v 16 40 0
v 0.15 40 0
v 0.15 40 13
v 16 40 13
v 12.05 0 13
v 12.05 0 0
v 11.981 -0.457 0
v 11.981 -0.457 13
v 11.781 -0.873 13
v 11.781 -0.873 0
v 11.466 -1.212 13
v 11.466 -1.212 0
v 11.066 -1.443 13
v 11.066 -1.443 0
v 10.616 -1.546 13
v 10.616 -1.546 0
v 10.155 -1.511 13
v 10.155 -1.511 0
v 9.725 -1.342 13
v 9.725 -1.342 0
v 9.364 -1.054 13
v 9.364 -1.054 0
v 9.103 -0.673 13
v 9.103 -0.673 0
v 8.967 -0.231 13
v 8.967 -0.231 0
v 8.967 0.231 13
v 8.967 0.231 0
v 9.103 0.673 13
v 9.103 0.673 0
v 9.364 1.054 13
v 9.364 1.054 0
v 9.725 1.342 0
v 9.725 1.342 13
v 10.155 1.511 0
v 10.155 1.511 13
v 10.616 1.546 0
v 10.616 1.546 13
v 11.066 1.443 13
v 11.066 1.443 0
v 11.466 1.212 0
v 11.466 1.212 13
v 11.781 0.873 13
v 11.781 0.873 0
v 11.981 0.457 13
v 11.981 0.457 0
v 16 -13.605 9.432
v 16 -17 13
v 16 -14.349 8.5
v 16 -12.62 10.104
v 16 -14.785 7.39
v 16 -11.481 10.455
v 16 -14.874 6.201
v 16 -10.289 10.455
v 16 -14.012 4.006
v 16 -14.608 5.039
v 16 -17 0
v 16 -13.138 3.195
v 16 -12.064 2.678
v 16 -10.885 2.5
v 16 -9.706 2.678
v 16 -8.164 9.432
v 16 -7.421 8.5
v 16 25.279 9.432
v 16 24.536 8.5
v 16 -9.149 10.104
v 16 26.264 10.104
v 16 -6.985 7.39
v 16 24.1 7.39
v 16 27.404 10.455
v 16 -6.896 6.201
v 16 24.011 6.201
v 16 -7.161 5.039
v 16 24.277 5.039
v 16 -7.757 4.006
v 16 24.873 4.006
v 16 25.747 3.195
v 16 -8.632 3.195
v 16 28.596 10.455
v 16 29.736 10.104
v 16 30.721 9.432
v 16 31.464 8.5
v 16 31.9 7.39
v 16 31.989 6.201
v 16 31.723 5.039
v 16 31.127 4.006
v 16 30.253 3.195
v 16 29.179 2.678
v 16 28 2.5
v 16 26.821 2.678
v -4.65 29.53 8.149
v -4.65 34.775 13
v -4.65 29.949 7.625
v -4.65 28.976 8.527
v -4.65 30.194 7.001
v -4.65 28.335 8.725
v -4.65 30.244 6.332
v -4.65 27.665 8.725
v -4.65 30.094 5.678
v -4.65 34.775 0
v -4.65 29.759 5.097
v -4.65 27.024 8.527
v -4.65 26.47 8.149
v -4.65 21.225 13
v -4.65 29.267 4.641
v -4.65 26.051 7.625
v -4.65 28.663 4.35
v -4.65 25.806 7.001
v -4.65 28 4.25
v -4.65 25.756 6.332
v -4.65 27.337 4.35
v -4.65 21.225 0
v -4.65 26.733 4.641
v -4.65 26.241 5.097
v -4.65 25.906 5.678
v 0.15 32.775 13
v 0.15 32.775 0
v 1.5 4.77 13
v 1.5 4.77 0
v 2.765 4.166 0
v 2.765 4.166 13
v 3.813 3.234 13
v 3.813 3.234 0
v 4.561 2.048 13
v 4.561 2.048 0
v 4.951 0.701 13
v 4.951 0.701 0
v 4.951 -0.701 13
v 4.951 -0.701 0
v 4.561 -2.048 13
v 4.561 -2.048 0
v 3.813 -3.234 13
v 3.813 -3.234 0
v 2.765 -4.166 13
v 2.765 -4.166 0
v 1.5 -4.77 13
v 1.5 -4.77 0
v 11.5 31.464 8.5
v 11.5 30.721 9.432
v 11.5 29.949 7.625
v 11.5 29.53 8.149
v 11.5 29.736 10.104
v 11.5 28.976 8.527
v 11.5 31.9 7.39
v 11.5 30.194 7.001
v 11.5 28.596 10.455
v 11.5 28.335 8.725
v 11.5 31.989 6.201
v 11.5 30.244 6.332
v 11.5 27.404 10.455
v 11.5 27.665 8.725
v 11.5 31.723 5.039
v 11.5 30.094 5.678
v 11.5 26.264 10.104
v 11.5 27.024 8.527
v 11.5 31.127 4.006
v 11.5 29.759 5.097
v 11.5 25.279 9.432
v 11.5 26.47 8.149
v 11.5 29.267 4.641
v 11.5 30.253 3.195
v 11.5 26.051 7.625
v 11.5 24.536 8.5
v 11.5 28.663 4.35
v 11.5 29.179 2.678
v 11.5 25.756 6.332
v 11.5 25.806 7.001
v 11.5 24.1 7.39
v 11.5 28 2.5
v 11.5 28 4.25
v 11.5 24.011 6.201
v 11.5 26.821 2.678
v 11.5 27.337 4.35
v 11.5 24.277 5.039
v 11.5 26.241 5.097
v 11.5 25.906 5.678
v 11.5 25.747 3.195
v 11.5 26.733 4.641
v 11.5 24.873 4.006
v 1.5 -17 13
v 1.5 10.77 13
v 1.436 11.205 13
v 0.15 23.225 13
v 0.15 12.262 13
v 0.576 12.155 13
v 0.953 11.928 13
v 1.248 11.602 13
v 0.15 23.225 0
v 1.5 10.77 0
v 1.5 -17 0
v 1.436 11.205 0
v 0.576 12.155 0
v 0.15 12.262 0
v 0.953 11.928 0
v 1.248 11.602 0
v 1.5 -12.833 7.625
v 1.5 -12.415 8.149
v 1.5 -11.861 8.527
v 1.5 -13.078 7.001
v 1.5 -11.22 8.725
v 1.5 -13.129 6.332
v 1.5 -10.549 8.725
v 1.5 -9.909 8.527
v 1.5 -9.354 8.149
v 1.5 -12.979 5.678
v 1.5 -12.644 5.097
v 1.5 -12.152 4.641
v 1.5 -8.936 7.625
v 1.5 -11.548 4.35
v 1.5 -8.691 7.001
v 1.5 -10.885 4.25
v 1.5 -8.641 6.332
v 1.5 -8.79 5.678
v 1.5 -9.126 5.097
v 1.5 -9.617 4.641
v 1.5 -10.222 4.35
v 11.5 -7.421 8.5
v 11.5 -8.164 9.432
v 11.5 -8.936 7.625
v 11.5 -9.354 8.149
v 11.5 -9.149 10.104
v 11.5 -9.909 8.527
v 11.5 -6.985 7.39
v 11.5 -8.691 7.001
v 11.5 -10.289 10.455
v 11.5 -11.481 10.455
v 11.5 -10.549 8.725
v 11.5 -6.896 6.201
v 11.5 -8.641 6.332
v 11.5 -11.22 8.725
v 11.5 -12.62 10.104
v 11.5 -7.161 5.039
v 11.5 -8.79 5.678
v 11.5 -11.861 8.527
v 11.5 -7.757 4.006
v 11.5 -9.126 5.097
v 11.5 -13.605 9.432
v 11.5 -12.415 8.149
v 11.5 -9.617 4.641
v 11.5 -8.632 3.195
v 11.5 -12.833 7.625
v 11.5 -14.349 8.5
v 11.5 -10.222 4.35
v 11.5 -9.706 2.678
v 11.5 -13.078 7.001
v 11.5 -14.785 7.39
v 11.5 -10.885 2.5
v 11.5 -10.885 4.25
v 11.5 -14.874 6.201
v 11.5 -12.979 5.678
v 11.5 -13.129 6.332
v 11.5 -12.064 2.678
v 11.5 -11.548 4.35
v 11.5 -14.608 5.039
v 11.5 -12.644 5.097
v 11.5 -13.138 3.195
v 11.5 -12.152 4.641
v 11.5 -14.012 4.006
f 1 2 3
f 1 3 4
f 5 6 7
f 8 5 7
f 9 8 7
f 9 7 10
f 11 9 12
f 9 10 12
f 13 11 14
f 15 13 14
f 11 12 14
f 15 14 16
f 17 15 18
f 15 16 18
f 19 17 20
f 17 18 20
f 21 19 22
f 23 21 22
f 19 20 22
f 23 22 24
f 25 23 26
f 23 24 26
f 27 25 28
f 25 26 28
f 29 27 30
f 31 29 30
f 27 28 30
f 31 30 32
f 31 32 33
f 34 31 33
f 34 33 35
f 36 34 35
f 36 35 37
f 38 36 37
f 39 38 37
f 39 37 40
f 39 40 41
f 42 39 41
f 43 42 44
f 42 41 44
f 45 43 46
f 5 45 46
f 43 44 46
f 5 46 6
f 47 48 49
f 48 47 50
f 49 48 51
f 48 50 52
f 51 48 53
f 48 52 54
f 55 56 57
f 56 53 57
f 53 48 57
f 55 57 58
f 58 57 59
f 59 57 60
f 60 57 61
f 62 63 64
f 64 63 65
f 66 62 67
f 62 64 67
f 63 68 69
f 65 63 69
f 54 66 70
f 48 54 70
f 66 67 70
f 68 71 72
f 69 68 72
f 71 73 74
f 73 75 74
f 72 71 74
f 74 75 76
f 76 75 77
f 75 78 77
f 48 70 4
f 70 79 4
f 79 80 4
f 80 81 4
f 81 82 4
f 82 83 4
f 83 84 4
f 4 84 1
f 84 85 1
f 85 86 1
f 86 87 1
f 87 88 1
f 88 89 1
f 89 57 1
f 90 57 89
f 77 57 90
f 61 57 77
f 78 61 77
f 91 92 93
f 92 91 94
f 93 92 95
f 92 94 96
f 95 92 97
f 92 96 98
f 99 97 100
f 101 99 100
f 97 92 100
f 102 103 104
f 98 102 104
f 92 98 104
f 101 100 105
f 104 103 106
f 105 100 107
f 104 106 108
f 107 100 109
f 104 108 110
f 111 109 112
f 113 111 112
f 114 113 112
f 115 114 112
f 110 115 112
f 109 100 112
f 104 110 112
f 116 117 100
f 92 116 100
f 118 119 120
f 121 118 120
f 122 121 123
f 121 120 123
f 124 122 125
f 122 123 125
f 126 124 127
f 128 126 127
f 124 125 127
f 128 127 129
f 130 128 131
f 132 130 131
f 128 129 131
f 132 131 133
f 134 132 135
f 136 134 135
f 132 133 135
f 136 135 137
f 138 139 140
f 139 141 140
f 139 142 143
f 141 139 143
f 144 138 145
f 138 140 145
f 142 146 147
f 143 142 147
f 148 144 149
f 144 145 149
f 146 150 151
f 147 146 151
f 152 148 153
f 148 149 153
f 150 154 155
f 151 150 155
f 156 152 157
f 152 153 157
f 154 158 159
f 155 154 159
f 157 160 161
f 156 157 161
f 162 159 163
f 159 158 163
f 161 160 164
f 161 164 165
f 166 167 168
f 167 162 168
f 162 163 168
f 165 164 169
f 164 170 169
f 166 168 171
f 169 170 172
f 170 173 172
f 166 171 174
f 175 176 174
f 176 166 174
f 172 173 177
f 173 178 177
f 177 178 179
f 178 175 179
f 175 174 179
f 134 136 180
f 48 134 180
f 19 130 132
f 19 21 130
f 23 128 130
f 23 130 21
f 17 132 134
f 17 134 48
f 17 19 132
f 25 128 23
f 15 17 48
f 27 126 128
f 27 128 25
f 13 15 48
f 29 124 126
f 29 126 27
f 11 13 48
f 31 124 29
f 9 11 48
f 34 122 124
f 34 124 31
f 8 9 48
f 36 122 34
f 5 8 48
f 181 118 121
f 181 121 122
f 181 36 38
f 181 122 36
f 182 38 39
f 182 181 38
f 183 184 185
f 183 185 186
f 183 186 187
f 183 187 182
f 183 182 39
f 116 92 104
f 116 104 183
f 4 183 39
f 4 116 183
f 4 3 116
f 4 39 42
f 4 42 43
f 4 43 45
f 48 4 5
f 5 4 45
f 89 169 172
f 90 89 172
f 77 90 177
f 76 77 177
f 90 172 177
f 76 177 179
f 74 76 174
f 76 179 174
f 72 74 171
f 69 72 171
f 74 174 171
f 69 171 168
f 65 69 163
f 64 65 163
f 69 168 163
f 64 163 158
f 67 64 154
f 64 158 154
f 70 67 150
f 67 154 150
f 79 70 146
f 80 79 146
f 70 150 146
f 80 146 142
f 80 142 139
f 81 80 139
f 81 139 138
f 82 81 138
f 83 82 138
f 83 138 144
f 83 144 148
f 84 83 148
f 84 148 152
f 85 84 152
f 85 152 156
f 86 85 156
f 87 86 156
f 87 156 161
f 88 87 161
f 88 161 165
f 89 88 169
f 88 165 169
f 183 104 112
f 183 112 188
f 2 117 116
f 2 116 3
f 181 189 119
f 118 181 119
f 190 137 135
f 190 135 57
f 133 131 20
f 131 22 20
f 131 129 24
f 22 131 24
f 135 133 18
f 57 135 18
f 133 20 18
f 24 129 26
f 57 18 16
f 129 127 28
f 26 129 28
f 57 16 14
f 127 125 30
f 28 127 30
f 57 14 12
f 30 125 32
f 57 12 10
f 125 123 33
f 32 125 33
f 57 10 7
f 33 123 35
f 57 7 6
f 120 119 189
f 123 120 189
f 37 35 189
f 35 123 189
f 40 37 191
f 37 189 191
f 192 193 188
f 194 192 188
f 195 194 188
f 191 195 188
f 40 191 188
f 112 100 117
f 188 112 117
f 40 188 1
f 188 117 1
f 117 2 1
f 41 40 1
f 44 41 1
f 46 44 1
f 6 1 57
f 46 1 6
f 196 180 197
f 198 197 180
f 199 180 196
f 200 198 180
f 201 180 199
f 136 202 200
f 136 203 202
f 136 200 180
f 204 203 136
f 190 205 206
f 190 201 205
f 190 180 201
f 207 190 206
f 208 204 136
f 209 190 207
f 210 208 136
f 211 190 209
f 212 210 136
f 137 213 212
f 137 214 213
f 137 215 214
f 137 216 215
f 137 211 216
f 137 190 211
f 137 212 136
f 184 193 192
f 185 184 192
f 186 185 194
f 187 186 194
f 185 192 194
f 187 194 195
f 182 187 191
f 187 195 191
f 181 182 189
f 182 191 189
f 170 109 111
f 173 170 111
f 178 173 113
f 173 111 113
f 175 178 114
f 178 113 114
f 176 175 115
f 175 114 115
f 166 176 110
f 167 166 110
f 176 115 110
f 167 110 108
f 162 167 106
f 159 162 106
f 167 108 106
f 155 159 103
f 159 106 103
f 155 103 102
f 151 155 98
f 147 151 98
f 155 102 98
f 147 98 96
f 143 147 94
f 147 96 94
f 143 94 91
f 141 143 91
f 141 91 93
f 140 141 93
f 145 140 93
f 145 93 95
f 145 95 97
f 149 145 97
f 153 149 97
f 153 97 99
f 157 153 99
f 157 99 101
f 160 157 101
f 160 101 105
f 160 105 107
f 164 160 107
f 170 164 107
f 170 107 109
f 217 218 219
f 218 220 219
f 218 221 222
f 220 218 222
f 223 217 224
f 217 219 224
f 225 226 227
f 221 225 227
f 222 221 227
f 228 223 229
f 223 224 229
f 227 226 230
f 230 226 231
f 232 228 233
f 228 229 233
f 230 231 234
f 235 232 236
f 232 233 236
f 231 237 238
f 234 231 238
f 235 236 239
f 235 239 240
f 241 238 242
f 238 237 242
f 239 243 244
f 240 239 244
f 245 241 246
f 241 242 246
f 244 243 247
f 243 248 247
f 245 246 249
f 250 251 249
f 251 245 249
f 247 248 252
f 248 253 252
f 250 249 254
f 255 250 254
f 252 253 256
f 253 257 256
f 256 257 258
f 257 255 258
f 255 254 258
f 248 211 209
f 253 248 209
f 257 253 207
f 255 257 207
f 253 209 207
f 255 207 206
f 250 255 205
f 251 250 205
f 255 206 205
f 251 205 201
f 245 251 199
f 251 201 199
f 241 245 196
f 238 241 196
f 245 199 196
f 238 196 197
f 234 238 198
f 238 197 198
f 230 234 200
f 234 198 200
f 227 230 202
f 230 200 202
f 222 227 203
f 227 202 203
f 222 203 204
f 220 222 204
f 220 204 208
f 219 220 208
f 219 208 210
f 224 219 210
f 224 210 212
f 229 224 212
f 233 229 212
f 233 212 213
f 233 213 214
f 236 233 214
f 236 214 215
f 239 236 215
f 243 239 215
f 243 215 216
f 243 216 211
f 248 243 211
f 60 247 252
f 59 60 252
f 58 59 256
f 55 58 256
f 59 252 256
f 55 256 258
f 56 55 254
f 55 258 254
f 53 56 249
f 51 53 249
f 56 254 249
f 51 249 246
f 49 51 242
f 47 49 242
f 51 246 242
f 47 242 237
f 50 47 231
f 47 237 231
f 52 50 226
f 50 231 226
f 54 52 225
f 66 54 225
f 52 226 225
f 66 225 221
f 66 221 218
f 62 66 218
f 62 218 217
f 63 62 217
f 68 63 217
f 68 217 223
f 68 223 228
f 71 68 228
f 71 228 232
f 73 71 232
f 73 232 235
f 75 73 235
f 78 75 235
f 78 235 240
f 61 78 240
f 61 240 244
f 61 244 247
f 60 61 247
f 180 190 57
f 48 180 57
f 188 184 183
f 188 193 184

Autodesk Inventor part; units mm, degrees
ref_plane "YZ Plane" through (0, 0, 0) normal (1, 0, 0) x (0, 1, 0)
ref_plane "XZ Plane" through (0, 0, 0) normal (0, 1, 0) x (-1, 0, 0)
sketch "Skizze1" plane through (0, 0, 0) normal (0, 0, 1) x (1, 0, 0)
  line L0 (-33.0017, 0) -> (83.0017, 0) construction
  circle A0 centre (50, 151.9868) radius 16
  line L1 (66, 151.9868) -> (66, 221.9868)
  line L2 (34, 151.9868) -> (34, 221.9868)
  line L3 (50, 151.9868) -> (50, 237.9868) construction
  line L4 (50, 151.9868) -> (50, 167.9868) construction
  line L5 (34, 151.9868) -> (66, 151.9868) construction
  line L6 (-16, 0) -> (-16, 50)
  line L7 (16, 0) -> (16, 50)
  line L8 (-16, 50) -> (16, 50) construction
  circle A1 centre (0, 50) radius 16 construction
  line L9 (-14.2566, 57.2629) -> (34, 151.9868)
  arc A2 (-14.2566, 57.2629) -> (-16, 50) centre (0, 50) ccw
  line L10 (16, 50) -> (64.2566, 144.7239)
  arc A3 (64.2566, 144.7239) -> (66, 151.9868) centre (50, 151.9868) ccw
  line L11 (0, 50) -> (50, 151.9868) construction
  circle A4 centre (50, 221.9868) radius 16
  circle A5 centre (50, 221.9868) radius 9.5
  circle A6 centre (50, 151.9868) radius 9.5
  line L12 (0, 0) -> (0, 5) construction
  circle A7 centre (50, 151.9868) radius 12.75 construction
  circle A8 centre (50, 221.9868) radius 12.75 construction
  line L13 (0, 0) -> (50, 221.9868) construction
  circle A9 centre (50, 221.9868) radius 10.5
  circle A10 centre (50, 151.9868) radius 10.5
  circle A11 centre (50, 151.9868) radius 12
  circle A12 centre (50, 221.9868) radius 12
  line L14 (-16, 0) -> (-16, -17)
  line L15 (-16, -17) -> (16, -17)
  line L16 (16, -17) -> (16, 0)
  circle A13 centre (0, 0) radius 5
  line L17 (-1.5, -4.7697) -> (-1.5, -17)
  line L18 (1.5, -17) -> (1.5, -4.7697)
  line L19 (-16, 0) -> (16, 0) construction
  arc A14 (16, 0) -> (-16, 0) centre (0, 0) ccw
  line L20 (-1.5, 4.7697) -> (-1.5, 10.7697)
  arc A15 (1.5, 10.7697) -> (-1.5, 10.7697) centre (0, 10.7697) ccw
  line L21 (1.5, 10.7697) -> (1.5, 4.7697)
  line L22 (1.5, 4.7697) -> (-1.5, 4.7697)
  line L23 (0, 12.2697) -> (0, 40)
  line L24 (0, 40) -> (16, 40)
  line L25 (0, 33) -> (-4.8, 35)
  line L26 (-4.8, 35) -> (-4.8, 21)
  line L27 (-4.8, 21) -> (0, 23)
  line L28 (-4.8, 28) -> (0, 28) construction
  line L29 (-4.8, 30.5) -> (0, 30.5) construction
  line L30 (-4.8, 25.5) -> (0, 25.5) construction
  circle A16 centre (-10.5, 0) radius 1.55
  circle A17 centre (10.5, 0) radius 1.55
  line L31 (0, 0) -> (50, 151.9868) construction
  point P0 (26.4122, 103.8739)
  point P1 (50, 186.9868)
  point P2 (50, 164.7368)
  point P3 (38.9582, 145.6118)
  point P4 (61.0418, 145.6118)
  point P5 (50, 234.7368)
  point P6 (38.9582, 215.6118)
  point P7 (61.0418, 215.6118)
  point P8 (-5, 0)
  dimension "d69" = 25.5
  dimension "ParallelHebel_Passflansch_HoleDia" = 25.5
  dimension "d36" = 0
  dimension "ParallelHebel_Gabelgelenk_OuterDia" = 32
  dimension "VerticalDistance" = 70
  dimension "d42" = 60
  dimension "d43" = 19
  dimension "Nadellager_OuterDia" = 19
  dimension "d45" = 35
  dimension "d67" = 360
  dimension "d72" = 360
  dimension "Distanze_daVinciHead_Pivot" = 221.9868
  dimension "d88" = 21
  dimension "d91" = 24
  dimension "d92" = 24
  dimension "d97" = 151.9868
  dimension "Support_Link_Length" = 160
  dimension "d100" = 10
  dimension "d101" = 3
  dimension "d102" = 0
  dimension "d103" = 17
  dimension "d105" = 32
  dimension "d125" = 50
  dimension "d128" = 50
  dimension "d138" = 6
  dimension "d139" = 10
  dimension "d142" = 14
  dimension "d143" = 10
  dimension "d144" = 2.5
  dimension "d145" = 5
  dimension "d146" = 4.8
  dimension "d147" = 28
  dimension "d173" = 11
  dimension "d174" = 5.5
  dimension "d175" = 3.1
  dimension "d178" = 71.79
extrude "Extrusion2" add sketch "Skizze1" along normal blind 8 contours A0 | A0 L2 A4 L1 | A0 L10 L7 L24 L23 L25 L26 L27 A14 L6 A2 L9 | A4 | L7 A14 L23 L24 | A14 L23 A15 L20 A13 L17 L15 L14 | L16 L15 L18 A13 L21 A15 L23 A14 | L23 L27 L26 L25 | A15 L21 A13 L20 | A9 | A10 | A11 | A12 | A16 | A17
fillet "Rundung1" radius 25 2 edges at (34, 151.9868, 4) (16, 50, 4)
hole "Bohrung2" at (50, 186.9868, 0) at (26.4122, 103.8739, 0) direction (0, 0, 1) diameter 8 end through all
ref_plane "Arbeitsebene1" through (50, 151.9868, 0) normal (-1, 0, 0) x (0, 0, 1)
extrude "Extrusion6" cut sketch "Skizze1" along normal blind 1 contours A5 | A9 | A10 | A11 | A12
extrude "Extrusion7" cut sketch "Skizze1" along normal blind 1 from surface at 1 contours A9 | A10
sketch "Skizze8" plane through (0, 0, 8) normal (0, 0, 1) x (1, 0, 0)
  circle A0 centre (50, 186.9868) radius 4 projected
  circle A1 centre (26.4122, 103.8739) radius 4 projected
  arc A2 (64.2566, 144.7239) -> (66, 151.9868) centre (50, 151.9868) ccw projected
  line L0 (66, 151.9868) -> (66, 221.9868) projected
  arc A3 (66, 221.9868) -> (34, 221.9868) centre (50, 221.9868) ccw projected
  line L1 (34, 221.9868) -> (34, 157.988) projected
  arc A4 (31.2759, 146.6396) -> (34, 157.988) centre (9, 157.988) ccw projected
  line L2 (31.2759, 146.6396) -> (-14.2566, 57.2629) projected
  arc A5 (-14.2566, 57.2629) -> (-16, 50) centre (0, 50) ccw projected
  line L3 (-16, 50) -> (-16, -17) projected
  line L4 (-16, -17) -> (-1.5, -17) projected
  line L5 (-1.5, -17) -> (-1.5, -4.7697) projected
  arc A6 (1.5, -4.7697) -> (-1.5, -4.7697) centre (0, 0) ccw projected
  line L6 (1.5, -4.7697) -> (1.5, -17) projected
  line L7 (1.5, -17) -> (16, -17) projected
  line L8 (16, -17) -> (16, 43.9989) projected
  arc A7 (18.7241, 55.3472) -> (16, 43.9989) centre (41, 43.9989) ccw projected
  line L9 (18.7241, 55.3472) -> (64.2566, 144.7239) projected
  circle A8 centre (50, 151.9868) radius 9.5 projected
  circle A9 centre (50, 221.9868) radius 9.5 projected
extrude "Extrusion9" add sketch "Skizze8" along normal blind 5
sketch "Skizze5" plane through (-1.5, -17, 0) normal (1, 0, 0) x (0, 0, -1)
  line L0 (0, 0) -> (0, 12.2303) construction
  line L1 (0, 12.2303) -> (-13, 12.2303) construction
  line L2 (0, 0) -> (-13, 0) construction
  line L3 (-13, 12.2303) -> (0, 0) construction
  line L4 (-13, 0) -> (0, 12.2303) construction
  line L5 (-13, 0) -> (-13, 12.2303) construction
  point P0 (0, 17)
  point P1 (-6.5, 6.1152)
extrude "Extrusion11" add sketch "Skizze1" along normal up to surface (13 mm away) separate body contours L7 A14 L23 L24 | L16 L15 L18 A13 L21 A15 L23 A14 | L23 L27 L26 L25 | A17
extrude "Extrusion10" cut sketch "Skizze1" along normal up to surface (13 mm away) contours L7 A14 L23 L24 | L16 L15 L18 A13 L21 A15 L23 A14 | L23 L27 L26 L25 | A15 L21 A13 L20 | A17 bodies 1
hole "Bohrung4" at (-1.5, -10.8848, 6.5) direction (-1, 0, 0) diameter 3.242 end through all bodies 1 thread size "M4x0.7" class "6H" standard "ISO Metric profile"
sketch "Skizze9" plane through (16, -17, 0) normal (1, 0, 0) x (0, 0, -1)
  point P0 (0, 17)
  point P1 (-6.5, 6.1152)
hole "Bohrung6" at (16, -10.8848, 6.5) direction (-1, 0, 0) diameter 4.5 depth 17.5 counterbore diameter 8 counterbore depth 4.5 bodies 2 clearance for "Inbusschraube DIN EN ISO 4762" size "M4" standard "DIN"
ref_plane "Arbeitsebene2" through (-4.8, 72.7467, 13) normal (-1, 0, 0) x (0, 1, 0)
sketch "Skizze12" plane through (-4.8, 72.7467, 13) normal (-1, 0, 0) x (0, 1, 0)
  line L0 (-44.7467, 13) -> (-44.7467, 6.5) construction
  line L1 (-22.7467, 13) -> (-89.7467, 13) construction
  line L2 (-22.7467, 0) -> (-89.7467, 0) construction
  point P0 (-72.7467, 13)
  point P1 (-44.7467, 13)
  dimension "d150" = 13
  dimension "d151" = 6.5
sketch "Skizze13" plane through (16, -17, 0) normal (1, 0, 0) x (0, 0, -1)
  point P0 (0, 17)
  point P1 (-6.5, 45)
hole "Bohrung7" at (-4.8, 28, 6.5) direction (-1, 0, 0) diameter 3.242 end through all bodies 1 thread size "M4x0.7" class "6H" standard "ISO Metric profile"
hole "Bohrung8" at (16, 28, 6.5) direction (-1, 0, 0) diameter 4.5 end through all counterbore diameter 8 counterbore depth 4.5 bodies 2 clearance for "Inbusschraube DIN EN ISO 4762" size "M4" standard "DIN"
extrude "Extrusion12" cut sketch "Skizze1" along normal through all contours A17 bodies 2
delete faces "Fläche löschen1" heal no whole lump yes faces at (-8.5333, 28.26, 4.9)
thicken "Thicken1" operation add thickness 0.15 both sides no extend neighbours yes toward (-0.3846154, -0.9230769, 0) bodies 2 faces at (-1.6, 33.6667, 4.3333) (-4.8, 22.5888, 6.5904) (-3.2, 21.6667, 4.3333) (0, 19.4232, 8.6667) (0, 37.6667, 4.3333)
equation "\"NKX_10_RiadialPart_Dia\" = 19"
equation "\"Lager_Bohrung_Durchmesser\" = 19"
equation "\"Lager_Einbautiefe\" = 5"
properties part number "ParallelSystem_ProximalPart_Driven_Counterpart" material "PBT-Kunststoff"
